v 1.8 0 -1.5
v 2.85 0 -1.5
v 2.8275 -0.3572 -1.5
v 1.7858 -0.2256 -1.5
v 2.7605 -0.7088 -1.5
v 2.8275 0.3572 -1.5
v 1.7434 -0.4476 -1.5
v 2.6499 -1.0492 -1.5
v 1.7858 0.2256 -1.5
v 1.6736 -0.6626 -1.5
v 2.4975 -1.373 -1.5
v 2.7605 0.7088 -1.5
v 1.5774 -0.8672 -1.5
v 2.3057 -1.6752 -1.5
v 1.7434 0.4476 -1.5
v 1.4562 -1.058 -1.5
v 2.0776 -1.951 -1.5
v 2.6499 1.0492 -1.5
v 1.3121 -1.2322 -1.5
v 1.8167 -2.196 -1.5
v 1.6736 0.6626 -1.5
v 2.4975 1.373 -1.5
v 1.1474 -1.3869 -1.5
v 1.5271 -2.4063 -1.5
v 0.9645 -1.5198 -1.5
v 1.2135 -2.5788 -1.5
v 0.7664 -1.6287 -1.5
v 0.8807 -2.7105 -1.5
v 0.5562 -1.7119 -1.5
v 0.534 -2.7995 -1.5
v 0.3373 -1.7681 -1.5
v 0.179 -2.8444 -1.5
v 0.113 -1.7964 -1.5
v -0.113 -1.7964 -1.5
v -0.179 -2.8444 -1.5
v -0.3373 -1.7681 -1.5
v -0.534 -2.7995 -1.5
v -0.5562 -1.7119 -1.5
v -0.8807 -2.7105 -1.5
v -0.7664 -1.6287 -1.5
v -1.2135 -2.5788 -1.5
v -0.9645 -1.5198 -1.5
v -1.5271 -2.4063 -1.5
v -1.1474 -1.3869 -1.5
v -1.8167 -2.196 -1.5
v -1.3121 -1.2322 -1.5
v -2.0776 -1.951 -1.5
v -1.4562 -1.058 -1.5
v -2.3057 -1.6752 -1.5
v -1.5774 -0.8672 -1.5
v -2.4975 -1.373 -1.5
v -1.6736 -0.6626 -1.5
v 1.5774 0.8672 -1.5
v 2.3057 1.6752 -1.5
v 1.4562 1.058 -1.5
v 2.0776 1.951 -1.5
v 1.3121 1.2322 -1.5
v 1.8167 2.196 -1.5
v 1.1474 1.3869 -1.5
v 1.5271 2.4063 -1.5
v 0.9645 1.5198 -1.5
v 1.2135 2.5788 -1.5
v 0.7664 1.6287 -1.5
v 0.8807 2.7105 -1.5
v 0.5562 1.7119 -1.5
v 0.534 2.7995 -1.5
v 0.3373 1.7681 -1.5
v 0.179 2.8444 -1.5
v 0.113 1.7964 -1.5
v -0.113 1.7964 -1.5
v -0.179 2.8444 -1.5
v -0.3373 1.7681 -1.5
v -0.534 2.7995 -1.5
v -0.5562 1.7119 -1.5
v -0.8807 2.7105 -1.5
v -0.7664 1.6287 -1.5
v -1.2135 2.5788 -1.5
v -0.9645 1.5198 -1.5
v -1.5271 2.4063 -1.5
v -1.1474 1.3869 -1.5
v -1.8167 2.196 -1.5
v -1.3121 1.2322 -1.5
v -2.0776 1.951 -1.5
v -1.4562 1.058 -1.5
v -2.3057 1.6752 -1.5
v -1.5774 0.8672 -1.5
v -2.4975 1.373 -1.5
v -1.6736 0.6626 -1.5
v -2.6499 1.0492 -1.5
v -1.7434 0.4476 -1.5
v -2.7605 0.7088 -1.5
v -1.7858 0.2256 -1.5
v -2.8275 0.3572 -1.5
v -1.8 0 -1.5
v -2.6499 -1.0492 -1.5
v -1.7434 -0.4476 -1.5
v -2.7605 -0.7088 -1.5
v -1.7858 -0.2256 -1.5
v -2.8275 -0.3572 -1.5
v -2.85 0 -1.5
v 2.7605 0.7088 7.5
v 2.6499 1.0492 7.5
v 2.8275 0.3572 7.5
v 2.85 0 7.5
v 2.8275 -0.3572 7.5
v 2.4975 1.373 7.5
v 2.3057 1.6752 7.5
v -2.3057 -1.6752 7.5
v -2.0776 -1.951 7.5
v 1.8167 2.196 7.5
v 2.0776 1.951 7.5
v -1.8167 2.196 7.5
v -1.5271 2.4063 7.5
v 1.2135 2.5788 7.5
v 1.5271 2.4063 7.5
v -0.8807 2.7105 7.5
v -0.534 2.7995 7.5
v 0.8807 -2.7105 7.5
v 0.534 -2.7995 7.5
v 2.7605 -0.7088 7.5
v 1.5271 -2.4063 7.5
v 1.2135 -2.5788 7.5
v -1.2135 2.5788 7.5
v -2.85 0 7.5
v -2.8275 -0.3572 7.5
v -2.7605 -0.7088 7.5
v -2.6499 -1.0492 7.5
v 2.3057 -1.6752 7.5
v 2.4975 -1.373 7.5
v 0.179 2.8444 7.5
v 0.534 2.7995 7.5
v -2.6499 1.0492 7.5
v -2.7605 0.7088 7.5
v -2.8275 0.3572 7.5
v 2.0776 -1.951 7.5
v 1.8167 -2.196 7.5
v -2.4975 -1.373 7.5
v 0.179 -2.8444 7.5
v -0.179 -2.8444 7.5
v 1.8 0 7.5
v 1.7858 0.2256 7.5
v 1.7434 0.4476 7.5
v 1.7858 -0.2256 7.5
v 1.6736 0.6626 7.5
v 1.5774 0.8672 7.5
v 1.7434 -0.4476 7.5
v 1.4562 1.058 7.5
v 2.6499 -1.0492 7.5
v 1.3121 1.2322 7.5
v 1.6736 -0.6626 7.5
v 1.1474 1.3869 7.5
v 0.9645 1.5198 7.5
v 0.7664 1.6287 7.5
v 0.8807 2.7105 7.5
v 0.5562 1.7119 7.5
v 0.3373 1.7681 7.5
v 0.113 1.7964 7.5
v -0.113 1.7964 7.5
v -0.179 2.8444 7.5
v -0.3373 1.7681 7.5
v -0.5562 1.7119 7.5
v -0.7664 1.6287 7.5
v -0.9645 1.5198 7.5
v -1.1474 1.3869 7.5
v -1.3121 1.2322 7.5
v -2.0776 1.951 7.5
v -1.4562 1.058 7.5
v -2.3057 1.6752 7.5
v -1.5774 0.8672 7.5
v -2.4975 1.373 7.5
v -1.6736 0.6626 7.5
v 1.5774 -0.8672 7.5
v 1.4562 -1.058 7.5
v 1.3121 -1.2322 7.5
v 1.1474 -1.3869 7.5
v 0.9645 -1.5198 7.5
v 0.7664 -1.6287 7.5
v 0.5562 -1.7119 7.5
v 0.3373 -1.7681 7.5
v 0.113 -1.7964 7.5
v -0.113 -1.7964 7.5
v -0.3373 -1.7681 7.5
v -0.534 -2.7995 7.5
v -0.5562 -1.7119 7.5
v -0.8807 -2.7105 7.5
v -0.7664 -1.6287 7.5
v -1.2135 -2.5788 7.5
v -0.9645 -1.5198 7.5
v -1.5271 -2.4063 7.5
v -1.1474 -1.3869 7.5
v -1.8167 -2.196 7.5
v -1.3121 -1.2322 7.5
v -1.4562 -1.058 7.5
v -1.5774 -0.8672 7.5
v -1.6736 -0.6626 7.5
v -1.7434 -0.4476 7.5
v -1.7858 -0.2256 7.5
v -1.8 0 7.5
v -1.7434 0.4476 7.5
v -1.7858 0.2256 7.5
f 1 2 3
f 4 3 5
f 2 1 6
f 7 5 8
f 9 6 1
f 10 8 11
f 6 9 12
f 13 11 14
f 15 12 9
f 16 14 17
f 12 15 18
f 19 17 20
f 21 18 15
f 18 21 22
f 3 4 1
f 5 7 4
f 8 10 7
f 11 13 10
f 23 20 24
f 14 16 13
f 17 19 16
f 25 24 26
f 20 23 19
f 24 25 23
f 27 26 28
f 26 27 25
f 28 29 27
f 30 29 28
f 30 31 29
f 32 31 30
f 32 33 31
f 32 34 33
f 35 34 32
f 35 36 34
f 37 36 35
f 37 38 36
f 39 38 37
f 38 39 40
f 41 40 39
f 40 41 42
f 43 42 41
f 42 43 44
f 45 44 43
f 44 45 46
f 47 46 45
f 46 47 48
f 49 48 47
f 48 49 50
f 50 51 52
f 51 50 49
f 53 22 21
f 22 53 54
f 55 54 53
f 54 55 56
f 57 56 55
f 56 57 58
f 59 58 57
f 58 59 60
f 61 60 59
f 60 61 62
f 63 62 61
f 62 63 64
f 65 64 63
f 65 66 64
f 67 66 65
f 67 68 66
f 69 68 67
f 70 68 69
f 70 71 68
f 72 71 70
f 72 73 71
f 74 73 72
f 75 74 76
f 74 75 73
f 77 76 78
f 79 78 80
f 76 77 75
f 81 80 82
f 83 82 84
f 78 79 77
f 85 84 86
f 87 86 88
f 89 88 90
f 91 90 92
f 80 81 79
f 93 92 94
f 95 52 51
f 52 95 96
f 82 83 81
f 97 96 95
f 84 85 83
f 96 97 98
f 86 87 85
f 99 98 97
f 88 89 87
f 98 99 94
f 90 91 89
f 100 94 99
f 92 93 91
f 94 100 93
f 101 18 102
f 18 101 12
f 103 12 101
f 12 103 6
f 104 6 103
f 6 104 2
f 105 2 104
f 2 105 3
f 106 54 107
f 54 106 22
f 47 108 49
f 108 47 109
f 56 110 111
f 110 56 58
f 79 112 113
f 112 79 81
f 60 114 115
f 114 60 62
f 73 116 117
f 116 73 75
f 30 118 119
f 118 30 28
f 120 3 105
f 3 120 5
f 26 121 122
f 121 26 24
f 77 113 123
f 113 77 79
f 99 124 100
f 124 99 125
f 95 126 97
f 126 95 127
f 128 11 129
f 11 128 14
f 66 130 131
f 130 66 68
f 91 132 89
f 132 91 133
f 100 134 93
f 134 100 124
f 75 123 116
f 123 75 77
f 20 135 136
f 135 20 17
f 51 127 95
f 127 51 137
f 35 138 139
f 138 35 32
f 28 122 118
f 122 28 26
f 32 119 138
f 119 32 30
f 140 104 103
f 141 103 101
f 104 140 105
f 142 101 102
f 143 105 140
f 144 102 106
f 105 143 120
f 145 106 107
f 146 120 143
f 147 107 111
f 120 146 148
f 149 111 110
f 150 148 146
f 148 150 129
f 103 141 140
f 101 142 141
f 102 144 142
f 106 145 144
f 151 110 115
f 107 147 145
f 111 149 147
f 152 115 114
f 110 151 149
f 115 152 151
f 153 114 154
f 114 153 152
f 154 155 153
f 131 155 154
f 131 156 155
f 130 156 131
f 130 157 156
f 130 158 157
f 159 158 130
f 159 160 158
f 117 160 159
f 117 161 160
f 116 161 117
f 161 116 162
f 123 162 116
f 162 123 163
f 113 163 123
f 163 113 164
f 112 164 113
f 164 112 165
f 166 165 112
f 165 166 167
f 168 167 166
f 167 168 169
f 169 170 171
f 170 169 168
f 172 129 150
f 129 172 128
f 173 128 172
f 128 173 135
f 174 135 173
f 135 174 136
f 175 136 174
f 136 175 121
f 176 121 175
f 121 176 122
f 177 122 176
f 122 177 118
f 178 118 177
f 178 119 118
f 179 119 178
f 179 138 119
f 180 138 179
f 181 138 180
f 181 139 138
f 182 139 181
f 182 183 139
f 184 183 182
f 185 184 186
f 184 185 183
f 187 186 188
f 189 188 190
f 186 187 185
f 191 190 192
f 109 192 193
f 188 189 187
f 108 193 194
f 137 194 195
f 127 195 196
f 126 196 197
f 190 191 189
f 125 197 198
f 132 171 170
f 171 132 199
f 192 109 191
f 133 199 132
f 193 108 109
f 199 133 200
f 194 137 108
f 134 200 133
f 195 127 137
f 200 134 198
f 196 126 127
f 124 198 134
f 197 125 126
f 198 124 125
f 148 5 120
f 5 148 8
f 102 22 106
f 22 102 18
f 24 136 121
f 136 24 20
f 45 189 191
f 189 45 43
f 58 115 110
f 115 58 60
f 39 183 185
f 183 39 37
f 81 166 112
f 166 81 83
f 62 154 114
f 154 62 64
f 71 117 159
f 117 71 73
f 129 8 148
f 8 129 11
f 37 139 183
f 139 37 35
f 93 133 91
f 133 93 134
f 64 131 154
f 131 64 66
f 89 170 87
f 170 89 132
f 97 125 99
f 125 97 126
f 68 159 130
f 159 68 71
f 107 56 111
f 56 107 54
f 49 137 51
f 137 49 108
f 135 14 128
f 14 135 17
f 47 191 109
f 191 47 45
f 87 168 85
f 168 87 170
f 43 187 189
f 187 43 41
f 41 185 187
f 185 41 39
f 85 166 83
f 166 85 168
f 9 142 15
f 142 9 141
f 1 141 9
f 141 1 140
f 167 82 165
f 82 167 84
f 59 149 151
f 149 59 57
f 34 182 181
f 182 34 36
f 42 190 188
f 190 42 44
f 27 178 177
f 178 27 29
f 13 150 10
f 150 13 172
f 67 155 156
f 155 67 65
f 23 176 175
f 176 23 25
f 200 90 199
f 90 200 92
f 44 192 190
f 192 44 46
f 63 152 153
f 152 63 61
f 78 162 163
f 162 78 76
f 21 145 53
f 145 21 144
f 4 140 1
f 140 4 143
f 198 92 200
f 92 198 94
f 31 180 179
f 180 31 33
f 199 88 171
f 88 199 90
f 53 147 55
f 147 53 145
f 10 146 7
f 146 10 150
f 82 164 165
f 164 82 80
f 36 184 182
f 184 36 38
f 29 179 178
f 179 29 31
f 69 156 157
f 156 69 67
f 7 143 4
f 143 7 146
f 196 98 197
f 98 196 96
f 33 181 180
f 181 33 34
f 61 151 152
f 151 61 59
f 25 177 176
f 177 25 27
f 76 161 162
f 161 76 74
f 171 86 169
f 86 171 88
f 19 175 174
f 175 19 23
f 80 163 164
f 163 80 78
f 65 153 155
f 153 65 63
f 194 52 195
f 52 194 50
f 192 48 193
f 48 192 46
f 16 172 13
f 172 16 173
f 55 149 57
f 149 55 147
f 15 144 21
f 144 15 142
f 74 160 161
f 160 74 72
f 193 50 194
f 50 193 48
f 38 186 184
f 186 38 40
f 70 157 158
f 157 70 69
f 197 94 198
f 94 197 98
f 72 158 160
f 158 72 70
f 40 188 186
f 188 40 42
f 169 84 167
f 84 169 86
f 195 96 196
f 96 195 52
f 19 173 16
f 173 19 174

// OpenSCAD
$fn = 50;


difference() {
	union() {
		translate(v = [0, 0, -1.5000000000]) {
			cylinder(h = 3, r = 1.0000000000);
		}
		translate(v = [0, 0, -1.5000000000]) {
			cylinder(h = 9, r = 2.8500000000);
		}
	}
	union() {
		translate(v = [0, 0, -50.0000000000]) {
			cylinder(h = 100, r = 1.8000000000);
		}
	}
}
